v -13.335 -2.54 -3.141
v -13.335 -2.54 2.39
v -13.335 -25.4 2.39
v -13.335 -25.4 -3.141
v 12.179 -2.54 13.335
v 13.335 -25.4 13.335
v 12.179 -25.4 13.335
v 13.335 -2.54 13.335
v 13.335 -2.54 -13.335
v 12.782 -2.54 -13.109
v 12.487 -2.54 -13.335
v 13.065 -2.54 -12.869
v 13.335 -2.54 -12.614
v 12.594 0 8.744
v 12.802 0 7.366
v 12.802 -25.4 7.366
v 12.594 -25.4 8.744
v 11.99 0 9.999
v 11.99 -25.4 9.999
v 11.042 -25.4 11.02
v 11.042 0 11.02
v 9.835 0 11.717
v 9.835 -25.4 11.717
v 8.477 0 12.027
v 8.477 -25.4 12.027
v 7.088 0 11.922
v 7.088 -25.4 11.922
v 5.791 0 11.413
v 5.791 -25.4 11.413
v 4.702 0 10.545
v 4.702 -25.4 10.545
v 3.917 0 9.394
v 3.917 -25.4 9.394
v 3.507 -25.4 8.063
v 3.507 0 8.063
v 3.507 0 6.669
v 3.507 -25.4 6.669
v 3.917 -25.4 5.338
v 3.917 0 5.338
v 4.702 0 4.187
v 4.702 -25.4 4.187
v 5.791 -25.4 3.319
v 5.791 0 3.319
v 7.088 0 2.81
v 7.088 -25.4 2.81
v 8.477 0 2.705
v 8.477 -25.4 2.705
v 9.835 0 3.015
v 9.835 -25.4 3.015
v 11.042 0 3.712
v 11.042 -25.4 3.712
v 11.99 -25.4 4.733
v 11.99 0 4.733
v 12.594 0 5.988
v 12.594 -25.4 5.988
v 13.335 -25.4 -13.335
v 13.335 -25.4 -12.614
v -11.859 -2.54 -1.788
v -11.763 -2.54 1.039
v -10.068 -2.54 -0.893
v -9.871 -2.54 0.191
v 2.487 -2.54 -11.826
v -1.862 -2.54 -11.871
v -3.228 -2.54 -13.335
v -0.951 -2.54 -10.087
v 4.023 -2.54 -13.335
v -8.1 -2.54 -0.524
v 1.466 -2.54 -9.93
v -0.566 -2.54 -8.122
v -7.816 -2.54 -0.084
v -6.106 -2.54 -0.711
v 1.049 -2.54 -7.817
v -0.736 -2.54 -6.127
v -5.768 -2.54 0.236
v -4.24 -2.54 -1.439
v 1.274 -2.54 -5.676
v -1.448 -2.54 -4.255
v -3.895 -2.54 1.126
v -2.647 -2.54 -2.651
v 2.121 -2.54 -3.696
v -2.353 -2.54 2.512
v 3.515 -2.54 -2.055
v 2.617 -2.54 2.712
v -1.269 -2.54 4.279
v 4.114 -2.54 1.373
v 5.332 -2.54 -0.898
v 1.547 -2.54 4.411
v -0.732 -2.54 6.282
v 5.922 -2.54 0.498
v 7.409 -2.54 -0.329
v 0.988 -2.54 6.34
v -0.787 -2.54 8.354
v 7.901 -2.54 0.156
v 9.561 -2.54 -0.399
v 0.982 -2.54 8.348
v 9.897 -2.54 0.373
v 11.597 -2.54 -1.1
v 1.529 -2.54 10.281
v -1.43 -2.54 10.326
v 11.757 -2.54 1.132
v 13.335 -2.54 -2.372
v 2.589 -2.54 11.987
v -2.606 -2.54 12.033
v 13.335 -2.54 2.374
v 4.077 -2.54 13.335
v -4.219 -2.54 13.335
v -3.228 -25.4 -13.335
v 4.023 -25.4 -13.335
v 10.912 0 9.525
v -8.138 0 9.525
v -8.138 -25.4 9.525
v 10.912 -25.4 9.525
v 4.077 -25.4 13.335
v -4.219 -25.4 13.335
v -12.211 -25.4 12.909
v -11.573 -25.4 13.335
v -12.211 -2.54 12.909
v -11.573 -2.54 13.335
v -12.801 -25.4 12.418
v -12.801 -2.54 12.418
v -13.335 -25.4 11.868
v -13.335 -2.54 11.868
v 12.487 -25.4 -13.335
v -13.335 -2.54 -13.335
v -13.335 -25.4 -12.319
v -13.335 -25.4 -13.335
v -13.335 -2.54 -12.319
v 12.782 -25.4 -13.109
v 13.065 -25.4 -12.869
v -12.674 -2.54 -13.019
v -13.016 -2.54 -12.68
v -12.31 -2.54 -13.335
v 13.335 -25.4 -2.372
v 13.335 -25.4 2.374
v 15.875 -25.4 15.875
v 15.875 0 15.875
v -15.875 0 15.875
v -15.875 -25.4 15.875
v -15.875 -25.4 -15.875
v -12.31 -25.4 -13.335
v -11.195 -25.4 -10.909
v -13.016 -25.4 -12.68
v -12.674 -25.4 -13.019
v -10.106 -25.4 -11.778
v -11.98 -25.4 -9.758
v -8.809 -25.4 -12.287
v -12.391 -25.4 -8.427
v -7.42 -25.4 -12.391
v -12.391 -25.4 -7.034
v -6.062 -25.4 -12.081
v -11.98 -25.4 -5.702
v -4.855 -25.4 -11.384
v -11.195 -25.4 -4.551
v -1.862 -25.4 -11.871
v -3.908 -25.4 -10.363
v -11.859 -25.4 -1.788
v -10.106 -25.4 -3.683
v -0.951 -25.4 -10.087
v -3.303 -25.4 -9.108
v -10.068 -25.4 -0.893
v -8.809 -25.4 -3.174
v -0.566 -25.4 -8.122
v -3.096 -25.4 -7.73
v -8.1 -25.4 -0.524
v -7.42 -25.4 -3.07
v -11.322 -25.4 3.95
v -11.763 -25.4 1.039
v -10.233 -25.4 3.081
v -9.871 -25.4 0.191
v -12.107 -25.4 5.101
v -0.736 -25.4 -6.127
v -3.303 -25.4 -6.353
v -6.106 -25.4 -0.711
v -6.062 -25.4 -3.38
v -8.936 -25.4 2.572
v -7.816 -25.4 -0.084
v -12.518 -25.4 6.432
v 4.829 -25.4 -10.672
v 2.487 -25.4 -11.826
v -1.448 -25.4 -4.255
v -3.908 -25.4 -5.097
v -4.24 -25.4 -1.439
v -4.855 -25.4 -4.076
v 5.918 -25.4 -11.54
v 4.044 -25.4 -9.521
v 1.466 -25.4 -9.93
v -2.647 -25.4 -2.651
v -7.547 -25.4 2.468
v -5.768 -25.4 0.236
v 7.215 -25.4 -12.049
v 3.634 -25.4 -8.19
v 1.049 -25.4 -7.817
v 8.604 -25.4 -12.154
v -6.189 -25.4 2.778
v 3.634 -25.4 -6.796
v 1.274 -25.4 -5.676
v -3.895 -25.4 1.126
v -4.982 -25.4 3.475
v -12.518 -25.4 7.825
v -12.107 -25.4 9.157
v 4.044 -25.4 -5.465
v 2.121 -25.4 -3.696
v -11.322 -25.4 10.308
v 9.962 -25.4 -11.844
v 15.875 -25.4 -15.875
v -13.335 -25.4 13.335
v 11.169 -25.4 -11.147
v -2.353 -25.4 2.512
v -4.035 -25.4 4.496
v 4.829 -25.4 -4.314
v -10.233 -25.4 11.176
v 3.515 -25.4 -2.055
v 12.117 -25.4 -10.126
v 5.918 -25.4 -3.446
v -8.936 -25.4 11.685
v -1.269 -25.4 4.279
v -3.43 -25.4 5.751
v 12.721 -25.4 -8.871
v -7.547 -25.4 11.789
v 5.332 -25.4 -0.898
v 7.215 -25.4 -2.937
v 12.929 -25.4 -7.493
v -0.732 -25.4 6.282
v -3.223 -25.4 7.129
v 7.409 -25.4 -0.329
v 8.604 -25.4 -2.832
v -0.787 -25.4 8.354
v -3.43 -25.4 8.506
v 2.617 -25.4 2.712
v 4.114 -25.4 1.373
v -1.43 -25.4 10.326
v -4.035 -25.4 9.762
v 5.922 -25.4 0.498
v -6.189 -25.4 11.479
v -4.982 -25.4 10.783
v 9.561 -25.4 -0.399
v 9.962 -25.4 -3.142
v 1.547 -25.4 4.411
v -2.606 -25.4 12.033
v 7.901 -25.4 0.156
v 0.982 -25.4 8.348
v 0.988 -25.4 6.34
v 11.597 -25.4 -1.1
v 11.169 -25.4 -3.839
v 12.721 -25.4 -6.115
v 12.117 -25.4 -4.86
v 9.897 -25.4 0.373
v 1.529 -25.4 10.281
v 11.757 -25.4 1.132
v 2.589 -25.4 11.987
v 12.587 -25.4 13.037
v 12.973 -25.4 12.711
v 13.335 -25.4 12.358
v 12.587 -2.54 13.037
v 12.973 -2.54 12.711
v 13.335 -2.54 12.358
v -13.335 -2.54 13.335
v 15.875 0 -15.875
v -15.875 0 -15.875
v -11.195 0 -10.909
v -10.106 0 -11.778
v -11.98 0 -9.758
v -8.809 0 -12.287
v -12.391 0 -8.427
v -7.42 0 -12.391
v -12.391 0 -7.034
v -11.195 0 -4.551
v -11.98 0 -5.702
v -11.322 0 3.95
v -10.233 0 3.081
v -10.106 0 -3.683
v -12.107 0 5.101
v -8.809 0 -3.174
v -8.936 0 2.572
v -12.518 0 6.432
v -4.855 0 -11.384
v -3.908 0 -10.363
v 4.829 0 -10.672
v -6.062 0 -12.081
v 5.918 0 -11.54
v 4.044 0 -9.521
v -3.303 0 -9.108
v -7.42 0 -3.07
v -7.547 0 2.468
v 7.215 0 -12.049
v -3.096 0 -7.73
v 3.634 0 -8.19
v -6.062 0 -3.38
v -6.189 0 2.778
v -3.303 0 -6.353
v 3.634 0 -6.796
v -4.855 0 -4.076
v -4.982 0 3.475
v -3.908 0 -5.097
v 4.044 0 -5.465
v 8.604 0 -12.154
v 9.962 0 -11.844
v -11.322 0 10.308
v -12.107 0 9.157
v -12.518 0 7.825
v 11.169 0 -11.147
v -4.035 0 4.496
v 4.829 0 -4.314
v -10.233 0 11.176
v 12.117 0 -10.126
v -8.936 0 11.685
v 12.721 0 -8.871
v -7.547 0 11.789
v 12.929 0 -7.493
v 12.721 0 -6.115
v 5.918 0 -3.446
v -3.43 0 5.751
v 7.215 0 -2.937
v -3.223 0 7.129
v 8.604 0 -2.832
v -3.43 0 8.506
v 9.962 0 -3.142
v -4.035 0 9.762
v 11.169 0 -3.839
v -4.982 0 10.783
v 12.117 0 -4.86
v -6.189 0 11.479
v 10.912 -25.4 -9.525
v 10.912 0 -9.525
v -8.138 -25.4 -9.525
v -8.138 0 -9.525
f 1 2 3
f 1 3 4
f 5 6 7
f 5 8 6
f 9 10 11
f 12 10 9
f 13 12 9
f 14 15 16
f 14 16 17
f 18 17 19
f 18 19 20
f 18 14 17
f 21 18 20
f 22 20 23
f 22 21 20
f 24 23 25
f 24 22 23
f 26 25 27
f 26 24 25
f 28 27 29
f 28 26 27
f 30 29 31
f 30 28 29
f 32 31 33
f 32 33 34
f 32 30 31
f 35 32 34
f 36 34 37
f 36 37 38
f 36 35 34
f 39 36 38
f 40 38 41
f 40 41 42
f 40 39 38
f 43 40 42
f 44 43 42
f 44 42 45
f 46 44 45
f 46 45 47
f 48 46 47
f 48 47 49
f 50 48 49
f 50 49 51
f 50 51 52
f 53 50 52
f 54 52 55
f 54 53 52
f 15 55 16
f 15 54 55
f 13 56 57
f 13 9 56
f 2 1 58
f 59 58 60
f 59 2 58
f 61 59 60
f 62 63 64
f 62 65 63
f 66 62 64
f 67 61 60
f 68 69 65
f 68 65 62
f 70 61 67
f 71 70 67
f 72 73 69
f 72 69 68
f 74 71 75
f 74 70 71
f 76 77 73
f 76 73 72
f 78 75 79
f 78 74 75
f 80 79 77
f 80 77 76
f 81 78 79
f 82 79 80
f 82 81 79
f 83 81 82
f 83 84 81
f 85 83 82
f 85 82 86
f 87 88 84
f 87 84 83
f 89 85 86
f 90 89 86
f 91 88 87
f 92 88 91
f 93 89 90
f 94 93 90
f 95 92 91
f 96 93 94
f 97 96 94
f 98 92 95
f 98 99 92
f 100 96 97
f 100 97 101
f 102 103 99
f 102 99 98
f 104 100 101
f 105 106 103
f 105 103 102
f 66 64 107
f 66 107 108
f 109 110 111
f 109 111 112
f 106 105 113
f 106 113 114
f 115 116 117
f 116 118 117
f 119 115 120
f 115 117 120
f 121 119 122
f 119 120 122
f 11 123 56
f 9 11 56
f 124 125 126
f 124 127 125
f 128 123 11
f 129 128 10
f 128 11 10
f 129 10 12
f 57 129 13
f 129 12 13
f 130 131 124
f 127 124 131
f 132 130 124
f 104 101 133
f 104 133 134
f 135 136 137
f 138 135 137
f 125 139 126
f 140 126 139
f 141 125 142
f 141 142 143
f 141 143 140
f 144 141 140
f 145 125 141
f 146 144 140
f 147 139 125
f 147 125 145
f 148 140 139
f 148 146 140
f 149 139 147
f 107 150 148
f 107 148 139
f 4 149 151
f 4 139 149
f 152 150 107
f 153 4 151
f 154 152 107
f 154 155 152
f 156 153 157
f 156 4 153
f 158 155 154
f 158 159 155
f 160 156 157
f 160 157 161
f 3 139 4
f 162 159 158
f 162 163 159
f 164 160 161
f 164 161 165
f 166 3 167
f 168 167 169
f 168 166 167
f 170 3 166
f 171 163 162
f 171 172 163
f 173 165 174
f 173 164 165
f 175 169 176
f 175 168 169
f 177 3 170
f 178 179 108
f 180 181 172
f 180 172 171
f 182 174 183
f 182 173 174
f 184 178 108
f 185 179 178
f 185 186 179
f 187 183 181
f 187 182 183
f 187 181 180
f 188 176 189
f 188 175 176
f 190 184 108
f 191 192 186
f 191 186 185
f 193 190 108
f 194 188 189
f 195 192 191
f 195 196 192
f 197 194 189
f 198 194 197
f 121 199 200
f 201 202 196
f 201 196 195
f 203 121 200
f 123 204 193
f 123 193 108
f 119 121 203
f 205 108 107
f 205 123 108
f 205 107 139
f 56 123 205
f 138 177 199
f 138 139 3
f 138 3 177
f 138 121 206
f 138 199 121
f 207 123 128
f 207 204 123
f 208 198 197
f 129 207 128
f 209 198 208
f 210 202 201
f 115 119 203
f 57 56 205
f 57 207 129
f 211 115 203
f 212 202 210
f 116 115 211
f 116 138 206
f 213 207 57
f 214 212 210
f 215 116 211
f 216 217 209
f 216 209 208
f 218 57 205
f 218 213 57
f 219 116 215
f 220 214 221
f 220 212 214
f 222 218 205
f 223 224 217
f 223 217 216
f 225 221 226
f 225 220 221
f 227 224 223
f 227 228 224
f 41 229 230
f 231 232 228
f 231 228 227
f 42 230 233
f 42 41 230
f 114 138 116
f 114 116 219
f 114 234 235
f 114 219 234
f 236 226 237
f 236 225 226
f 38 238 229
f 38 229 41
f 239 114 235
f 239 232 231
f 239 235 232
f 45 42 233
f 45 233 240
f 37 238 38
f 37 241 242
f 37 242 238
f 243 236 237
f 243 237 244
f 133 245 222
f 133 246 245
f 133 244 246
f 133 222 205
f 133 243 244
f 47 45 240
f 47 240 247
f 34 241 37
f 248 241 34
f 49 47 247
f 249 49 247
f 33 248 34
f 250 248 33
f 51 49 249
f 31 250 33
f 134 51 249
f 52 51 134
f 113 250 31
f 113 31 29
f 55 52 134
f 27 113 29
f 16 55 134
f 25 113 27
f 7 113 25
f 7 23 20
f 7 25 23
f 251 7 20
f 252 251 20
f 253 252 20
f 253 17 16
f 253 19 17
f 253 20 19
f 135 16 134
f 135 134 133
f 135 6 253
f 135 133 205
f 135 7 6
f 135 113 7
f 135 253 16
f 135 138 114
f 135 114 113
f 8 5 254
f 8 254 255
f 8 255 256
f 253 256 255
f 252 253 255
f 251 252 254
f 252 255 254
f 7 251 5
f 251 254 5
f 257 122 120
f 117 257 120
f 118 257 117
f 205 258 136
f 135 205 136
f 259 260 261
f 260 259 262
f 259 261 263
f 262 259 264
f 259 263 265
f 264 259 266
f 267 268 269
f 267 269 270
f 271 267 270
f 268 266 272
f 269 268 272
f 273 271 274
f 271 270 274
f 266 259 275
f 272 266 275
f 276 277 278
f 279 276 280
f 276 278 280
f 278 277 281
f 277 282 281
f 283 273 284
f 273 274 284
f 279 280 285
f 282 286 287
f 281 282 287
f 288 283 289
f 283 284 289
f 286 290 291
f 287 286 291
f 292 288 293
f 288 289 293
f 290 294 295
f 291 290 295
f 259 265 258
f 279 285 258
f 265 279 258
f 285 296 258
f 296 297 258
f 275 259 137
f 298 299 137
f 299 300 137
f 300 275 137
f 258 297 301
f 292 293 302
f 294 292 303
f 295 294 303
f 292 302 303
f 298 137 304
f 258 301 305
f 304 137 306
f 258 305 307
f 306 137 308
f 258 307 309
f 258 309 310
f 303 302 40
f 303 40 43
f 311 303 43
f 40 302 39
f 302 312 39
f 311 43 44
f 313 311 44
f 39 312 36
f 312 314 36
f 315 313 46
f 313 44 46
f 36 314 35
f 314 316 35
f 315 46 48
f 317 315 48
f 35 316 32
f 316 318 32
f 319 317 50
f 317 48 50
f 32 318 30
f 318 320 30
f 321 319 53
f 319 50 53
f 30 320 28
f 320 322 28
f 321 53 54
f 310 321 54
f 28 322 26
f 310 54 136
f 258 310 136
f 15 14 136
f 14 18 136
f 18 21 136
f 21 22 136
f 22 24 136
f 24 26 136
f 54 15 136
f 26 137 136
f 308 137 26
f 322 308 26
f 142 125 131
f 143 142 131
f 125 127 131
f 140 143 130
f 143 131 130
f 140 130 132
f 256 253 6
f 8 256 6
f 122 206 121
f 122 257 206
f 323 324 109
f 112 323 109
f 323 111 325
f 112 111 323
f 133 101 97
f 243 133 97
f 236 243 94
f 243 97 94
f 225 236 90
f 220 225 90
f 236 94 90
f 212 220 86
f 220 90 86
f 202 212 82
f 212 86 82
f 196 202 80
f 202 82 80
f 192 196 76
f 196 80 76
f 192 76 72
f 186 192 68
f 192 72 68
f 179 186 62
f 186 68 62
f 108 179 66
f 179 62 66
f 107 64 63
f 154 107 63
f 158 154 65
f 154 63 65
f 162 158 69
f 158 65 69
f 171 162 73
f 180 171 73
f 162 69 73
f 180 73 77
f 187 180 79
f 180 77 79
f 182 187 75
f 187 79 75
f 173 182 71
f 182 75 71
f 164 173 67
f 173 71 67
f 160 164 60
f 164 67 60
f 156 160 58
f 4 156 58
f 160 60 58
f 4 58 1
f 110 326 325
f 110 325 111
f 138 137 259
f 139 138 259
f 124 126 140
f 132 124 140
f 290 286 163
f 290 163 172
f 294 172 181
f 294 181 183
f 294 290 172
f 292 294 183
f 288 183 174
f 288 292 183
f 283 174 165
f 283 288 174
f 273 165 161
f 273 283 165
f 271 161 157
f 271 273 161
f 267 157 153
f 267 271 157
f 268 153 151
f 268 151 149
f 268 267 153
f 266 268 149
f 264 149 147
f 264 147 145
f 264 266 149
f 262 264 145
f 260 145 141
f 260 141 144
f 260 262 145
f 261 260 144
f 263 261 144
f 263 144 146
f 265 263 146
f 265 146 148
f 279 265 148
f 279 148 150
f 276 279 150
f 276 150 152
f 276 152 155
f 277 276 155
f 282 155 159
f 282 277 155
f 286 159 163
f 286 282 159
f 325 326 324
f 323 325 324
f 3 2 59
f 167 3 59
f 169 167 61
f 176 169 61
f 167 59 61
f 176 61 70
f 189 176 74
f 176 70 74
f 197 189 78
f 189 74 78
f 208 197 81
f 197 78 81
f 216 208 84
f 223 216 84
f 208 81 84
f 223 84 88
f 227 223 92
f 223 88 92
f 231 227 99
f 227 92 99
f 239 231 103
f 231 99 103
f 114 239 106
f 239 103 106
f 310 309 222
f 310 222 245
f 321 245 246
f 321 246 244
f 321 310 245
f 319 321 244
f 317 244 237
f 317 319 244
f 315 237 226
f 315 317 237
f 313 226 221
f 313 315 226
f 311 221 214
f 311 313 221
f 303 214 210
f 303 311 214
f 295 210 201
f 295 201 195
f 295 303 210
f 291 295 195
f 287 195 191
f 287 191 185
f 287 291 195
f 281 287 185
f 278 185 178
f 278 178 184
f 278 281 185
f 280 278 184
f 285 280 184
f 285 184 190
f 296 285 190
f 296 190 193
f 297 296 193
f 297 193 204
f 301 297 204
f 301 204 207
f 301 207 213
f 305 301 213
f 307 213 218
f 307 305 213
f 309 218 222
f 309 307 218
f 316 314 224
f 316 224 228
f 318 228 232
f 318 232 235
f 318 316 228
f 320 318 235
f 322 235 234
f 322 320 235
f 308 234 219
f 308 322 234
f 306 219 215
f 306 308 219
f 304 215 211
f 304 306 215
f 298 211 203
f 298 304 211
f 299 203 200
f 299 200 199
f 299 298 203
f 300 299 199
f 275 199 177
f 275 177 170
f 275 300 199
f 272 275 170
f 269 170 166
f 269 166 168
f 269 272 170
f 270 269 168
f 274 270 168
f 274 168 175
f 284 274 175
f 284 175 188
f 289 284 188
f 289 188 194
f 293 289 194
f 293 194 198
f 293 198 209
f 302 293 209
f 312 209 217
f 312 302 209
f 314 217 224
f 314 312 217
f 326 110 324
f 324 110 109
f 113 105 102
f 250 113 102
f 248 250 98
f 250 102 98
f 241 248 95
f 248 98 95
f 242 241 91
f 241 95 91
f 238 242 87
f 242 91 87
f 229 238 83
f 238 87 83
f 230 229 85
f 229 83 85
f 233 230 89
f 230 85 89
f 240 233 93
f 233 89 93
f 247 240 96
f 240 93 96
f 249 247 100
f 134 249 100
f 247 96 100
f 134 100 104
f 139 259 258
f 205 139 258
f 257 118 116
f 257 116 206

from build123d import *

# Parameters (mm, degrees)
F1_R     = 4.6736
F1_W     = 31.623
F1_H     = 16.891
F2_DEPTH = 25.4
F3_T     = -2.54
F0_W     = 19.05
F0_H     = 19.05
F5_DEPTH = 25.4


# Not quite as in the source:
# - the program builds the solid bodies; features that only make, move or delete a surface that nothing else refers to are left out


with BuildPart() as f2:
    # F1 (on Front) → F2 (new body)
    with BuildSketch(Plane.XZ):
        Polygon((15.875, 1.016), (15.875, 15.875), (-15.875, 15.875), (-15.875, -15.875), (-15.748, -15.875), (-15.748, 1.016), align=None)
        with Locations((-7.8961248569, 7.1288868002)):
            Circle(F1_R, mode=Mode.SUBTRACT)
        with Locations((8.128, 7.366)):
            Circle(F1_R, mode=Mode.SUBTRACT)
        with Locations((0.0635, -7.4295)):
            Rectangle(F1_W, F1_H)
        with Locations((-7.7691248569, -7.7301131998)):
            Circle(F1_R, mode=Mode.SUBTRACT)
        with Locations((8.255, -7.493)):
            Circle(F1_R, mode=Mode.SUBTRACT)
    extrude(amount=F2_DEPTH)

    # F3
    f3_openings = [f2.faces().sort_by_distance(p)[0] for p in [
        (-0.06714, -25.4, 0.068119),
    ]]
    offset(amount=F3_T, openings=f3_openings)


with BuildPart() as f5:
    # F0 (on Front) → F5 (new body)
    with BuildSketch(Plane.XZ):
        with Locations((1.3871352458, 0)):
            Rectangle(F0_W, F0_H)
    extrude(amount=F5_DEPTH)


solid = Compound([f2.part, f5.part])
